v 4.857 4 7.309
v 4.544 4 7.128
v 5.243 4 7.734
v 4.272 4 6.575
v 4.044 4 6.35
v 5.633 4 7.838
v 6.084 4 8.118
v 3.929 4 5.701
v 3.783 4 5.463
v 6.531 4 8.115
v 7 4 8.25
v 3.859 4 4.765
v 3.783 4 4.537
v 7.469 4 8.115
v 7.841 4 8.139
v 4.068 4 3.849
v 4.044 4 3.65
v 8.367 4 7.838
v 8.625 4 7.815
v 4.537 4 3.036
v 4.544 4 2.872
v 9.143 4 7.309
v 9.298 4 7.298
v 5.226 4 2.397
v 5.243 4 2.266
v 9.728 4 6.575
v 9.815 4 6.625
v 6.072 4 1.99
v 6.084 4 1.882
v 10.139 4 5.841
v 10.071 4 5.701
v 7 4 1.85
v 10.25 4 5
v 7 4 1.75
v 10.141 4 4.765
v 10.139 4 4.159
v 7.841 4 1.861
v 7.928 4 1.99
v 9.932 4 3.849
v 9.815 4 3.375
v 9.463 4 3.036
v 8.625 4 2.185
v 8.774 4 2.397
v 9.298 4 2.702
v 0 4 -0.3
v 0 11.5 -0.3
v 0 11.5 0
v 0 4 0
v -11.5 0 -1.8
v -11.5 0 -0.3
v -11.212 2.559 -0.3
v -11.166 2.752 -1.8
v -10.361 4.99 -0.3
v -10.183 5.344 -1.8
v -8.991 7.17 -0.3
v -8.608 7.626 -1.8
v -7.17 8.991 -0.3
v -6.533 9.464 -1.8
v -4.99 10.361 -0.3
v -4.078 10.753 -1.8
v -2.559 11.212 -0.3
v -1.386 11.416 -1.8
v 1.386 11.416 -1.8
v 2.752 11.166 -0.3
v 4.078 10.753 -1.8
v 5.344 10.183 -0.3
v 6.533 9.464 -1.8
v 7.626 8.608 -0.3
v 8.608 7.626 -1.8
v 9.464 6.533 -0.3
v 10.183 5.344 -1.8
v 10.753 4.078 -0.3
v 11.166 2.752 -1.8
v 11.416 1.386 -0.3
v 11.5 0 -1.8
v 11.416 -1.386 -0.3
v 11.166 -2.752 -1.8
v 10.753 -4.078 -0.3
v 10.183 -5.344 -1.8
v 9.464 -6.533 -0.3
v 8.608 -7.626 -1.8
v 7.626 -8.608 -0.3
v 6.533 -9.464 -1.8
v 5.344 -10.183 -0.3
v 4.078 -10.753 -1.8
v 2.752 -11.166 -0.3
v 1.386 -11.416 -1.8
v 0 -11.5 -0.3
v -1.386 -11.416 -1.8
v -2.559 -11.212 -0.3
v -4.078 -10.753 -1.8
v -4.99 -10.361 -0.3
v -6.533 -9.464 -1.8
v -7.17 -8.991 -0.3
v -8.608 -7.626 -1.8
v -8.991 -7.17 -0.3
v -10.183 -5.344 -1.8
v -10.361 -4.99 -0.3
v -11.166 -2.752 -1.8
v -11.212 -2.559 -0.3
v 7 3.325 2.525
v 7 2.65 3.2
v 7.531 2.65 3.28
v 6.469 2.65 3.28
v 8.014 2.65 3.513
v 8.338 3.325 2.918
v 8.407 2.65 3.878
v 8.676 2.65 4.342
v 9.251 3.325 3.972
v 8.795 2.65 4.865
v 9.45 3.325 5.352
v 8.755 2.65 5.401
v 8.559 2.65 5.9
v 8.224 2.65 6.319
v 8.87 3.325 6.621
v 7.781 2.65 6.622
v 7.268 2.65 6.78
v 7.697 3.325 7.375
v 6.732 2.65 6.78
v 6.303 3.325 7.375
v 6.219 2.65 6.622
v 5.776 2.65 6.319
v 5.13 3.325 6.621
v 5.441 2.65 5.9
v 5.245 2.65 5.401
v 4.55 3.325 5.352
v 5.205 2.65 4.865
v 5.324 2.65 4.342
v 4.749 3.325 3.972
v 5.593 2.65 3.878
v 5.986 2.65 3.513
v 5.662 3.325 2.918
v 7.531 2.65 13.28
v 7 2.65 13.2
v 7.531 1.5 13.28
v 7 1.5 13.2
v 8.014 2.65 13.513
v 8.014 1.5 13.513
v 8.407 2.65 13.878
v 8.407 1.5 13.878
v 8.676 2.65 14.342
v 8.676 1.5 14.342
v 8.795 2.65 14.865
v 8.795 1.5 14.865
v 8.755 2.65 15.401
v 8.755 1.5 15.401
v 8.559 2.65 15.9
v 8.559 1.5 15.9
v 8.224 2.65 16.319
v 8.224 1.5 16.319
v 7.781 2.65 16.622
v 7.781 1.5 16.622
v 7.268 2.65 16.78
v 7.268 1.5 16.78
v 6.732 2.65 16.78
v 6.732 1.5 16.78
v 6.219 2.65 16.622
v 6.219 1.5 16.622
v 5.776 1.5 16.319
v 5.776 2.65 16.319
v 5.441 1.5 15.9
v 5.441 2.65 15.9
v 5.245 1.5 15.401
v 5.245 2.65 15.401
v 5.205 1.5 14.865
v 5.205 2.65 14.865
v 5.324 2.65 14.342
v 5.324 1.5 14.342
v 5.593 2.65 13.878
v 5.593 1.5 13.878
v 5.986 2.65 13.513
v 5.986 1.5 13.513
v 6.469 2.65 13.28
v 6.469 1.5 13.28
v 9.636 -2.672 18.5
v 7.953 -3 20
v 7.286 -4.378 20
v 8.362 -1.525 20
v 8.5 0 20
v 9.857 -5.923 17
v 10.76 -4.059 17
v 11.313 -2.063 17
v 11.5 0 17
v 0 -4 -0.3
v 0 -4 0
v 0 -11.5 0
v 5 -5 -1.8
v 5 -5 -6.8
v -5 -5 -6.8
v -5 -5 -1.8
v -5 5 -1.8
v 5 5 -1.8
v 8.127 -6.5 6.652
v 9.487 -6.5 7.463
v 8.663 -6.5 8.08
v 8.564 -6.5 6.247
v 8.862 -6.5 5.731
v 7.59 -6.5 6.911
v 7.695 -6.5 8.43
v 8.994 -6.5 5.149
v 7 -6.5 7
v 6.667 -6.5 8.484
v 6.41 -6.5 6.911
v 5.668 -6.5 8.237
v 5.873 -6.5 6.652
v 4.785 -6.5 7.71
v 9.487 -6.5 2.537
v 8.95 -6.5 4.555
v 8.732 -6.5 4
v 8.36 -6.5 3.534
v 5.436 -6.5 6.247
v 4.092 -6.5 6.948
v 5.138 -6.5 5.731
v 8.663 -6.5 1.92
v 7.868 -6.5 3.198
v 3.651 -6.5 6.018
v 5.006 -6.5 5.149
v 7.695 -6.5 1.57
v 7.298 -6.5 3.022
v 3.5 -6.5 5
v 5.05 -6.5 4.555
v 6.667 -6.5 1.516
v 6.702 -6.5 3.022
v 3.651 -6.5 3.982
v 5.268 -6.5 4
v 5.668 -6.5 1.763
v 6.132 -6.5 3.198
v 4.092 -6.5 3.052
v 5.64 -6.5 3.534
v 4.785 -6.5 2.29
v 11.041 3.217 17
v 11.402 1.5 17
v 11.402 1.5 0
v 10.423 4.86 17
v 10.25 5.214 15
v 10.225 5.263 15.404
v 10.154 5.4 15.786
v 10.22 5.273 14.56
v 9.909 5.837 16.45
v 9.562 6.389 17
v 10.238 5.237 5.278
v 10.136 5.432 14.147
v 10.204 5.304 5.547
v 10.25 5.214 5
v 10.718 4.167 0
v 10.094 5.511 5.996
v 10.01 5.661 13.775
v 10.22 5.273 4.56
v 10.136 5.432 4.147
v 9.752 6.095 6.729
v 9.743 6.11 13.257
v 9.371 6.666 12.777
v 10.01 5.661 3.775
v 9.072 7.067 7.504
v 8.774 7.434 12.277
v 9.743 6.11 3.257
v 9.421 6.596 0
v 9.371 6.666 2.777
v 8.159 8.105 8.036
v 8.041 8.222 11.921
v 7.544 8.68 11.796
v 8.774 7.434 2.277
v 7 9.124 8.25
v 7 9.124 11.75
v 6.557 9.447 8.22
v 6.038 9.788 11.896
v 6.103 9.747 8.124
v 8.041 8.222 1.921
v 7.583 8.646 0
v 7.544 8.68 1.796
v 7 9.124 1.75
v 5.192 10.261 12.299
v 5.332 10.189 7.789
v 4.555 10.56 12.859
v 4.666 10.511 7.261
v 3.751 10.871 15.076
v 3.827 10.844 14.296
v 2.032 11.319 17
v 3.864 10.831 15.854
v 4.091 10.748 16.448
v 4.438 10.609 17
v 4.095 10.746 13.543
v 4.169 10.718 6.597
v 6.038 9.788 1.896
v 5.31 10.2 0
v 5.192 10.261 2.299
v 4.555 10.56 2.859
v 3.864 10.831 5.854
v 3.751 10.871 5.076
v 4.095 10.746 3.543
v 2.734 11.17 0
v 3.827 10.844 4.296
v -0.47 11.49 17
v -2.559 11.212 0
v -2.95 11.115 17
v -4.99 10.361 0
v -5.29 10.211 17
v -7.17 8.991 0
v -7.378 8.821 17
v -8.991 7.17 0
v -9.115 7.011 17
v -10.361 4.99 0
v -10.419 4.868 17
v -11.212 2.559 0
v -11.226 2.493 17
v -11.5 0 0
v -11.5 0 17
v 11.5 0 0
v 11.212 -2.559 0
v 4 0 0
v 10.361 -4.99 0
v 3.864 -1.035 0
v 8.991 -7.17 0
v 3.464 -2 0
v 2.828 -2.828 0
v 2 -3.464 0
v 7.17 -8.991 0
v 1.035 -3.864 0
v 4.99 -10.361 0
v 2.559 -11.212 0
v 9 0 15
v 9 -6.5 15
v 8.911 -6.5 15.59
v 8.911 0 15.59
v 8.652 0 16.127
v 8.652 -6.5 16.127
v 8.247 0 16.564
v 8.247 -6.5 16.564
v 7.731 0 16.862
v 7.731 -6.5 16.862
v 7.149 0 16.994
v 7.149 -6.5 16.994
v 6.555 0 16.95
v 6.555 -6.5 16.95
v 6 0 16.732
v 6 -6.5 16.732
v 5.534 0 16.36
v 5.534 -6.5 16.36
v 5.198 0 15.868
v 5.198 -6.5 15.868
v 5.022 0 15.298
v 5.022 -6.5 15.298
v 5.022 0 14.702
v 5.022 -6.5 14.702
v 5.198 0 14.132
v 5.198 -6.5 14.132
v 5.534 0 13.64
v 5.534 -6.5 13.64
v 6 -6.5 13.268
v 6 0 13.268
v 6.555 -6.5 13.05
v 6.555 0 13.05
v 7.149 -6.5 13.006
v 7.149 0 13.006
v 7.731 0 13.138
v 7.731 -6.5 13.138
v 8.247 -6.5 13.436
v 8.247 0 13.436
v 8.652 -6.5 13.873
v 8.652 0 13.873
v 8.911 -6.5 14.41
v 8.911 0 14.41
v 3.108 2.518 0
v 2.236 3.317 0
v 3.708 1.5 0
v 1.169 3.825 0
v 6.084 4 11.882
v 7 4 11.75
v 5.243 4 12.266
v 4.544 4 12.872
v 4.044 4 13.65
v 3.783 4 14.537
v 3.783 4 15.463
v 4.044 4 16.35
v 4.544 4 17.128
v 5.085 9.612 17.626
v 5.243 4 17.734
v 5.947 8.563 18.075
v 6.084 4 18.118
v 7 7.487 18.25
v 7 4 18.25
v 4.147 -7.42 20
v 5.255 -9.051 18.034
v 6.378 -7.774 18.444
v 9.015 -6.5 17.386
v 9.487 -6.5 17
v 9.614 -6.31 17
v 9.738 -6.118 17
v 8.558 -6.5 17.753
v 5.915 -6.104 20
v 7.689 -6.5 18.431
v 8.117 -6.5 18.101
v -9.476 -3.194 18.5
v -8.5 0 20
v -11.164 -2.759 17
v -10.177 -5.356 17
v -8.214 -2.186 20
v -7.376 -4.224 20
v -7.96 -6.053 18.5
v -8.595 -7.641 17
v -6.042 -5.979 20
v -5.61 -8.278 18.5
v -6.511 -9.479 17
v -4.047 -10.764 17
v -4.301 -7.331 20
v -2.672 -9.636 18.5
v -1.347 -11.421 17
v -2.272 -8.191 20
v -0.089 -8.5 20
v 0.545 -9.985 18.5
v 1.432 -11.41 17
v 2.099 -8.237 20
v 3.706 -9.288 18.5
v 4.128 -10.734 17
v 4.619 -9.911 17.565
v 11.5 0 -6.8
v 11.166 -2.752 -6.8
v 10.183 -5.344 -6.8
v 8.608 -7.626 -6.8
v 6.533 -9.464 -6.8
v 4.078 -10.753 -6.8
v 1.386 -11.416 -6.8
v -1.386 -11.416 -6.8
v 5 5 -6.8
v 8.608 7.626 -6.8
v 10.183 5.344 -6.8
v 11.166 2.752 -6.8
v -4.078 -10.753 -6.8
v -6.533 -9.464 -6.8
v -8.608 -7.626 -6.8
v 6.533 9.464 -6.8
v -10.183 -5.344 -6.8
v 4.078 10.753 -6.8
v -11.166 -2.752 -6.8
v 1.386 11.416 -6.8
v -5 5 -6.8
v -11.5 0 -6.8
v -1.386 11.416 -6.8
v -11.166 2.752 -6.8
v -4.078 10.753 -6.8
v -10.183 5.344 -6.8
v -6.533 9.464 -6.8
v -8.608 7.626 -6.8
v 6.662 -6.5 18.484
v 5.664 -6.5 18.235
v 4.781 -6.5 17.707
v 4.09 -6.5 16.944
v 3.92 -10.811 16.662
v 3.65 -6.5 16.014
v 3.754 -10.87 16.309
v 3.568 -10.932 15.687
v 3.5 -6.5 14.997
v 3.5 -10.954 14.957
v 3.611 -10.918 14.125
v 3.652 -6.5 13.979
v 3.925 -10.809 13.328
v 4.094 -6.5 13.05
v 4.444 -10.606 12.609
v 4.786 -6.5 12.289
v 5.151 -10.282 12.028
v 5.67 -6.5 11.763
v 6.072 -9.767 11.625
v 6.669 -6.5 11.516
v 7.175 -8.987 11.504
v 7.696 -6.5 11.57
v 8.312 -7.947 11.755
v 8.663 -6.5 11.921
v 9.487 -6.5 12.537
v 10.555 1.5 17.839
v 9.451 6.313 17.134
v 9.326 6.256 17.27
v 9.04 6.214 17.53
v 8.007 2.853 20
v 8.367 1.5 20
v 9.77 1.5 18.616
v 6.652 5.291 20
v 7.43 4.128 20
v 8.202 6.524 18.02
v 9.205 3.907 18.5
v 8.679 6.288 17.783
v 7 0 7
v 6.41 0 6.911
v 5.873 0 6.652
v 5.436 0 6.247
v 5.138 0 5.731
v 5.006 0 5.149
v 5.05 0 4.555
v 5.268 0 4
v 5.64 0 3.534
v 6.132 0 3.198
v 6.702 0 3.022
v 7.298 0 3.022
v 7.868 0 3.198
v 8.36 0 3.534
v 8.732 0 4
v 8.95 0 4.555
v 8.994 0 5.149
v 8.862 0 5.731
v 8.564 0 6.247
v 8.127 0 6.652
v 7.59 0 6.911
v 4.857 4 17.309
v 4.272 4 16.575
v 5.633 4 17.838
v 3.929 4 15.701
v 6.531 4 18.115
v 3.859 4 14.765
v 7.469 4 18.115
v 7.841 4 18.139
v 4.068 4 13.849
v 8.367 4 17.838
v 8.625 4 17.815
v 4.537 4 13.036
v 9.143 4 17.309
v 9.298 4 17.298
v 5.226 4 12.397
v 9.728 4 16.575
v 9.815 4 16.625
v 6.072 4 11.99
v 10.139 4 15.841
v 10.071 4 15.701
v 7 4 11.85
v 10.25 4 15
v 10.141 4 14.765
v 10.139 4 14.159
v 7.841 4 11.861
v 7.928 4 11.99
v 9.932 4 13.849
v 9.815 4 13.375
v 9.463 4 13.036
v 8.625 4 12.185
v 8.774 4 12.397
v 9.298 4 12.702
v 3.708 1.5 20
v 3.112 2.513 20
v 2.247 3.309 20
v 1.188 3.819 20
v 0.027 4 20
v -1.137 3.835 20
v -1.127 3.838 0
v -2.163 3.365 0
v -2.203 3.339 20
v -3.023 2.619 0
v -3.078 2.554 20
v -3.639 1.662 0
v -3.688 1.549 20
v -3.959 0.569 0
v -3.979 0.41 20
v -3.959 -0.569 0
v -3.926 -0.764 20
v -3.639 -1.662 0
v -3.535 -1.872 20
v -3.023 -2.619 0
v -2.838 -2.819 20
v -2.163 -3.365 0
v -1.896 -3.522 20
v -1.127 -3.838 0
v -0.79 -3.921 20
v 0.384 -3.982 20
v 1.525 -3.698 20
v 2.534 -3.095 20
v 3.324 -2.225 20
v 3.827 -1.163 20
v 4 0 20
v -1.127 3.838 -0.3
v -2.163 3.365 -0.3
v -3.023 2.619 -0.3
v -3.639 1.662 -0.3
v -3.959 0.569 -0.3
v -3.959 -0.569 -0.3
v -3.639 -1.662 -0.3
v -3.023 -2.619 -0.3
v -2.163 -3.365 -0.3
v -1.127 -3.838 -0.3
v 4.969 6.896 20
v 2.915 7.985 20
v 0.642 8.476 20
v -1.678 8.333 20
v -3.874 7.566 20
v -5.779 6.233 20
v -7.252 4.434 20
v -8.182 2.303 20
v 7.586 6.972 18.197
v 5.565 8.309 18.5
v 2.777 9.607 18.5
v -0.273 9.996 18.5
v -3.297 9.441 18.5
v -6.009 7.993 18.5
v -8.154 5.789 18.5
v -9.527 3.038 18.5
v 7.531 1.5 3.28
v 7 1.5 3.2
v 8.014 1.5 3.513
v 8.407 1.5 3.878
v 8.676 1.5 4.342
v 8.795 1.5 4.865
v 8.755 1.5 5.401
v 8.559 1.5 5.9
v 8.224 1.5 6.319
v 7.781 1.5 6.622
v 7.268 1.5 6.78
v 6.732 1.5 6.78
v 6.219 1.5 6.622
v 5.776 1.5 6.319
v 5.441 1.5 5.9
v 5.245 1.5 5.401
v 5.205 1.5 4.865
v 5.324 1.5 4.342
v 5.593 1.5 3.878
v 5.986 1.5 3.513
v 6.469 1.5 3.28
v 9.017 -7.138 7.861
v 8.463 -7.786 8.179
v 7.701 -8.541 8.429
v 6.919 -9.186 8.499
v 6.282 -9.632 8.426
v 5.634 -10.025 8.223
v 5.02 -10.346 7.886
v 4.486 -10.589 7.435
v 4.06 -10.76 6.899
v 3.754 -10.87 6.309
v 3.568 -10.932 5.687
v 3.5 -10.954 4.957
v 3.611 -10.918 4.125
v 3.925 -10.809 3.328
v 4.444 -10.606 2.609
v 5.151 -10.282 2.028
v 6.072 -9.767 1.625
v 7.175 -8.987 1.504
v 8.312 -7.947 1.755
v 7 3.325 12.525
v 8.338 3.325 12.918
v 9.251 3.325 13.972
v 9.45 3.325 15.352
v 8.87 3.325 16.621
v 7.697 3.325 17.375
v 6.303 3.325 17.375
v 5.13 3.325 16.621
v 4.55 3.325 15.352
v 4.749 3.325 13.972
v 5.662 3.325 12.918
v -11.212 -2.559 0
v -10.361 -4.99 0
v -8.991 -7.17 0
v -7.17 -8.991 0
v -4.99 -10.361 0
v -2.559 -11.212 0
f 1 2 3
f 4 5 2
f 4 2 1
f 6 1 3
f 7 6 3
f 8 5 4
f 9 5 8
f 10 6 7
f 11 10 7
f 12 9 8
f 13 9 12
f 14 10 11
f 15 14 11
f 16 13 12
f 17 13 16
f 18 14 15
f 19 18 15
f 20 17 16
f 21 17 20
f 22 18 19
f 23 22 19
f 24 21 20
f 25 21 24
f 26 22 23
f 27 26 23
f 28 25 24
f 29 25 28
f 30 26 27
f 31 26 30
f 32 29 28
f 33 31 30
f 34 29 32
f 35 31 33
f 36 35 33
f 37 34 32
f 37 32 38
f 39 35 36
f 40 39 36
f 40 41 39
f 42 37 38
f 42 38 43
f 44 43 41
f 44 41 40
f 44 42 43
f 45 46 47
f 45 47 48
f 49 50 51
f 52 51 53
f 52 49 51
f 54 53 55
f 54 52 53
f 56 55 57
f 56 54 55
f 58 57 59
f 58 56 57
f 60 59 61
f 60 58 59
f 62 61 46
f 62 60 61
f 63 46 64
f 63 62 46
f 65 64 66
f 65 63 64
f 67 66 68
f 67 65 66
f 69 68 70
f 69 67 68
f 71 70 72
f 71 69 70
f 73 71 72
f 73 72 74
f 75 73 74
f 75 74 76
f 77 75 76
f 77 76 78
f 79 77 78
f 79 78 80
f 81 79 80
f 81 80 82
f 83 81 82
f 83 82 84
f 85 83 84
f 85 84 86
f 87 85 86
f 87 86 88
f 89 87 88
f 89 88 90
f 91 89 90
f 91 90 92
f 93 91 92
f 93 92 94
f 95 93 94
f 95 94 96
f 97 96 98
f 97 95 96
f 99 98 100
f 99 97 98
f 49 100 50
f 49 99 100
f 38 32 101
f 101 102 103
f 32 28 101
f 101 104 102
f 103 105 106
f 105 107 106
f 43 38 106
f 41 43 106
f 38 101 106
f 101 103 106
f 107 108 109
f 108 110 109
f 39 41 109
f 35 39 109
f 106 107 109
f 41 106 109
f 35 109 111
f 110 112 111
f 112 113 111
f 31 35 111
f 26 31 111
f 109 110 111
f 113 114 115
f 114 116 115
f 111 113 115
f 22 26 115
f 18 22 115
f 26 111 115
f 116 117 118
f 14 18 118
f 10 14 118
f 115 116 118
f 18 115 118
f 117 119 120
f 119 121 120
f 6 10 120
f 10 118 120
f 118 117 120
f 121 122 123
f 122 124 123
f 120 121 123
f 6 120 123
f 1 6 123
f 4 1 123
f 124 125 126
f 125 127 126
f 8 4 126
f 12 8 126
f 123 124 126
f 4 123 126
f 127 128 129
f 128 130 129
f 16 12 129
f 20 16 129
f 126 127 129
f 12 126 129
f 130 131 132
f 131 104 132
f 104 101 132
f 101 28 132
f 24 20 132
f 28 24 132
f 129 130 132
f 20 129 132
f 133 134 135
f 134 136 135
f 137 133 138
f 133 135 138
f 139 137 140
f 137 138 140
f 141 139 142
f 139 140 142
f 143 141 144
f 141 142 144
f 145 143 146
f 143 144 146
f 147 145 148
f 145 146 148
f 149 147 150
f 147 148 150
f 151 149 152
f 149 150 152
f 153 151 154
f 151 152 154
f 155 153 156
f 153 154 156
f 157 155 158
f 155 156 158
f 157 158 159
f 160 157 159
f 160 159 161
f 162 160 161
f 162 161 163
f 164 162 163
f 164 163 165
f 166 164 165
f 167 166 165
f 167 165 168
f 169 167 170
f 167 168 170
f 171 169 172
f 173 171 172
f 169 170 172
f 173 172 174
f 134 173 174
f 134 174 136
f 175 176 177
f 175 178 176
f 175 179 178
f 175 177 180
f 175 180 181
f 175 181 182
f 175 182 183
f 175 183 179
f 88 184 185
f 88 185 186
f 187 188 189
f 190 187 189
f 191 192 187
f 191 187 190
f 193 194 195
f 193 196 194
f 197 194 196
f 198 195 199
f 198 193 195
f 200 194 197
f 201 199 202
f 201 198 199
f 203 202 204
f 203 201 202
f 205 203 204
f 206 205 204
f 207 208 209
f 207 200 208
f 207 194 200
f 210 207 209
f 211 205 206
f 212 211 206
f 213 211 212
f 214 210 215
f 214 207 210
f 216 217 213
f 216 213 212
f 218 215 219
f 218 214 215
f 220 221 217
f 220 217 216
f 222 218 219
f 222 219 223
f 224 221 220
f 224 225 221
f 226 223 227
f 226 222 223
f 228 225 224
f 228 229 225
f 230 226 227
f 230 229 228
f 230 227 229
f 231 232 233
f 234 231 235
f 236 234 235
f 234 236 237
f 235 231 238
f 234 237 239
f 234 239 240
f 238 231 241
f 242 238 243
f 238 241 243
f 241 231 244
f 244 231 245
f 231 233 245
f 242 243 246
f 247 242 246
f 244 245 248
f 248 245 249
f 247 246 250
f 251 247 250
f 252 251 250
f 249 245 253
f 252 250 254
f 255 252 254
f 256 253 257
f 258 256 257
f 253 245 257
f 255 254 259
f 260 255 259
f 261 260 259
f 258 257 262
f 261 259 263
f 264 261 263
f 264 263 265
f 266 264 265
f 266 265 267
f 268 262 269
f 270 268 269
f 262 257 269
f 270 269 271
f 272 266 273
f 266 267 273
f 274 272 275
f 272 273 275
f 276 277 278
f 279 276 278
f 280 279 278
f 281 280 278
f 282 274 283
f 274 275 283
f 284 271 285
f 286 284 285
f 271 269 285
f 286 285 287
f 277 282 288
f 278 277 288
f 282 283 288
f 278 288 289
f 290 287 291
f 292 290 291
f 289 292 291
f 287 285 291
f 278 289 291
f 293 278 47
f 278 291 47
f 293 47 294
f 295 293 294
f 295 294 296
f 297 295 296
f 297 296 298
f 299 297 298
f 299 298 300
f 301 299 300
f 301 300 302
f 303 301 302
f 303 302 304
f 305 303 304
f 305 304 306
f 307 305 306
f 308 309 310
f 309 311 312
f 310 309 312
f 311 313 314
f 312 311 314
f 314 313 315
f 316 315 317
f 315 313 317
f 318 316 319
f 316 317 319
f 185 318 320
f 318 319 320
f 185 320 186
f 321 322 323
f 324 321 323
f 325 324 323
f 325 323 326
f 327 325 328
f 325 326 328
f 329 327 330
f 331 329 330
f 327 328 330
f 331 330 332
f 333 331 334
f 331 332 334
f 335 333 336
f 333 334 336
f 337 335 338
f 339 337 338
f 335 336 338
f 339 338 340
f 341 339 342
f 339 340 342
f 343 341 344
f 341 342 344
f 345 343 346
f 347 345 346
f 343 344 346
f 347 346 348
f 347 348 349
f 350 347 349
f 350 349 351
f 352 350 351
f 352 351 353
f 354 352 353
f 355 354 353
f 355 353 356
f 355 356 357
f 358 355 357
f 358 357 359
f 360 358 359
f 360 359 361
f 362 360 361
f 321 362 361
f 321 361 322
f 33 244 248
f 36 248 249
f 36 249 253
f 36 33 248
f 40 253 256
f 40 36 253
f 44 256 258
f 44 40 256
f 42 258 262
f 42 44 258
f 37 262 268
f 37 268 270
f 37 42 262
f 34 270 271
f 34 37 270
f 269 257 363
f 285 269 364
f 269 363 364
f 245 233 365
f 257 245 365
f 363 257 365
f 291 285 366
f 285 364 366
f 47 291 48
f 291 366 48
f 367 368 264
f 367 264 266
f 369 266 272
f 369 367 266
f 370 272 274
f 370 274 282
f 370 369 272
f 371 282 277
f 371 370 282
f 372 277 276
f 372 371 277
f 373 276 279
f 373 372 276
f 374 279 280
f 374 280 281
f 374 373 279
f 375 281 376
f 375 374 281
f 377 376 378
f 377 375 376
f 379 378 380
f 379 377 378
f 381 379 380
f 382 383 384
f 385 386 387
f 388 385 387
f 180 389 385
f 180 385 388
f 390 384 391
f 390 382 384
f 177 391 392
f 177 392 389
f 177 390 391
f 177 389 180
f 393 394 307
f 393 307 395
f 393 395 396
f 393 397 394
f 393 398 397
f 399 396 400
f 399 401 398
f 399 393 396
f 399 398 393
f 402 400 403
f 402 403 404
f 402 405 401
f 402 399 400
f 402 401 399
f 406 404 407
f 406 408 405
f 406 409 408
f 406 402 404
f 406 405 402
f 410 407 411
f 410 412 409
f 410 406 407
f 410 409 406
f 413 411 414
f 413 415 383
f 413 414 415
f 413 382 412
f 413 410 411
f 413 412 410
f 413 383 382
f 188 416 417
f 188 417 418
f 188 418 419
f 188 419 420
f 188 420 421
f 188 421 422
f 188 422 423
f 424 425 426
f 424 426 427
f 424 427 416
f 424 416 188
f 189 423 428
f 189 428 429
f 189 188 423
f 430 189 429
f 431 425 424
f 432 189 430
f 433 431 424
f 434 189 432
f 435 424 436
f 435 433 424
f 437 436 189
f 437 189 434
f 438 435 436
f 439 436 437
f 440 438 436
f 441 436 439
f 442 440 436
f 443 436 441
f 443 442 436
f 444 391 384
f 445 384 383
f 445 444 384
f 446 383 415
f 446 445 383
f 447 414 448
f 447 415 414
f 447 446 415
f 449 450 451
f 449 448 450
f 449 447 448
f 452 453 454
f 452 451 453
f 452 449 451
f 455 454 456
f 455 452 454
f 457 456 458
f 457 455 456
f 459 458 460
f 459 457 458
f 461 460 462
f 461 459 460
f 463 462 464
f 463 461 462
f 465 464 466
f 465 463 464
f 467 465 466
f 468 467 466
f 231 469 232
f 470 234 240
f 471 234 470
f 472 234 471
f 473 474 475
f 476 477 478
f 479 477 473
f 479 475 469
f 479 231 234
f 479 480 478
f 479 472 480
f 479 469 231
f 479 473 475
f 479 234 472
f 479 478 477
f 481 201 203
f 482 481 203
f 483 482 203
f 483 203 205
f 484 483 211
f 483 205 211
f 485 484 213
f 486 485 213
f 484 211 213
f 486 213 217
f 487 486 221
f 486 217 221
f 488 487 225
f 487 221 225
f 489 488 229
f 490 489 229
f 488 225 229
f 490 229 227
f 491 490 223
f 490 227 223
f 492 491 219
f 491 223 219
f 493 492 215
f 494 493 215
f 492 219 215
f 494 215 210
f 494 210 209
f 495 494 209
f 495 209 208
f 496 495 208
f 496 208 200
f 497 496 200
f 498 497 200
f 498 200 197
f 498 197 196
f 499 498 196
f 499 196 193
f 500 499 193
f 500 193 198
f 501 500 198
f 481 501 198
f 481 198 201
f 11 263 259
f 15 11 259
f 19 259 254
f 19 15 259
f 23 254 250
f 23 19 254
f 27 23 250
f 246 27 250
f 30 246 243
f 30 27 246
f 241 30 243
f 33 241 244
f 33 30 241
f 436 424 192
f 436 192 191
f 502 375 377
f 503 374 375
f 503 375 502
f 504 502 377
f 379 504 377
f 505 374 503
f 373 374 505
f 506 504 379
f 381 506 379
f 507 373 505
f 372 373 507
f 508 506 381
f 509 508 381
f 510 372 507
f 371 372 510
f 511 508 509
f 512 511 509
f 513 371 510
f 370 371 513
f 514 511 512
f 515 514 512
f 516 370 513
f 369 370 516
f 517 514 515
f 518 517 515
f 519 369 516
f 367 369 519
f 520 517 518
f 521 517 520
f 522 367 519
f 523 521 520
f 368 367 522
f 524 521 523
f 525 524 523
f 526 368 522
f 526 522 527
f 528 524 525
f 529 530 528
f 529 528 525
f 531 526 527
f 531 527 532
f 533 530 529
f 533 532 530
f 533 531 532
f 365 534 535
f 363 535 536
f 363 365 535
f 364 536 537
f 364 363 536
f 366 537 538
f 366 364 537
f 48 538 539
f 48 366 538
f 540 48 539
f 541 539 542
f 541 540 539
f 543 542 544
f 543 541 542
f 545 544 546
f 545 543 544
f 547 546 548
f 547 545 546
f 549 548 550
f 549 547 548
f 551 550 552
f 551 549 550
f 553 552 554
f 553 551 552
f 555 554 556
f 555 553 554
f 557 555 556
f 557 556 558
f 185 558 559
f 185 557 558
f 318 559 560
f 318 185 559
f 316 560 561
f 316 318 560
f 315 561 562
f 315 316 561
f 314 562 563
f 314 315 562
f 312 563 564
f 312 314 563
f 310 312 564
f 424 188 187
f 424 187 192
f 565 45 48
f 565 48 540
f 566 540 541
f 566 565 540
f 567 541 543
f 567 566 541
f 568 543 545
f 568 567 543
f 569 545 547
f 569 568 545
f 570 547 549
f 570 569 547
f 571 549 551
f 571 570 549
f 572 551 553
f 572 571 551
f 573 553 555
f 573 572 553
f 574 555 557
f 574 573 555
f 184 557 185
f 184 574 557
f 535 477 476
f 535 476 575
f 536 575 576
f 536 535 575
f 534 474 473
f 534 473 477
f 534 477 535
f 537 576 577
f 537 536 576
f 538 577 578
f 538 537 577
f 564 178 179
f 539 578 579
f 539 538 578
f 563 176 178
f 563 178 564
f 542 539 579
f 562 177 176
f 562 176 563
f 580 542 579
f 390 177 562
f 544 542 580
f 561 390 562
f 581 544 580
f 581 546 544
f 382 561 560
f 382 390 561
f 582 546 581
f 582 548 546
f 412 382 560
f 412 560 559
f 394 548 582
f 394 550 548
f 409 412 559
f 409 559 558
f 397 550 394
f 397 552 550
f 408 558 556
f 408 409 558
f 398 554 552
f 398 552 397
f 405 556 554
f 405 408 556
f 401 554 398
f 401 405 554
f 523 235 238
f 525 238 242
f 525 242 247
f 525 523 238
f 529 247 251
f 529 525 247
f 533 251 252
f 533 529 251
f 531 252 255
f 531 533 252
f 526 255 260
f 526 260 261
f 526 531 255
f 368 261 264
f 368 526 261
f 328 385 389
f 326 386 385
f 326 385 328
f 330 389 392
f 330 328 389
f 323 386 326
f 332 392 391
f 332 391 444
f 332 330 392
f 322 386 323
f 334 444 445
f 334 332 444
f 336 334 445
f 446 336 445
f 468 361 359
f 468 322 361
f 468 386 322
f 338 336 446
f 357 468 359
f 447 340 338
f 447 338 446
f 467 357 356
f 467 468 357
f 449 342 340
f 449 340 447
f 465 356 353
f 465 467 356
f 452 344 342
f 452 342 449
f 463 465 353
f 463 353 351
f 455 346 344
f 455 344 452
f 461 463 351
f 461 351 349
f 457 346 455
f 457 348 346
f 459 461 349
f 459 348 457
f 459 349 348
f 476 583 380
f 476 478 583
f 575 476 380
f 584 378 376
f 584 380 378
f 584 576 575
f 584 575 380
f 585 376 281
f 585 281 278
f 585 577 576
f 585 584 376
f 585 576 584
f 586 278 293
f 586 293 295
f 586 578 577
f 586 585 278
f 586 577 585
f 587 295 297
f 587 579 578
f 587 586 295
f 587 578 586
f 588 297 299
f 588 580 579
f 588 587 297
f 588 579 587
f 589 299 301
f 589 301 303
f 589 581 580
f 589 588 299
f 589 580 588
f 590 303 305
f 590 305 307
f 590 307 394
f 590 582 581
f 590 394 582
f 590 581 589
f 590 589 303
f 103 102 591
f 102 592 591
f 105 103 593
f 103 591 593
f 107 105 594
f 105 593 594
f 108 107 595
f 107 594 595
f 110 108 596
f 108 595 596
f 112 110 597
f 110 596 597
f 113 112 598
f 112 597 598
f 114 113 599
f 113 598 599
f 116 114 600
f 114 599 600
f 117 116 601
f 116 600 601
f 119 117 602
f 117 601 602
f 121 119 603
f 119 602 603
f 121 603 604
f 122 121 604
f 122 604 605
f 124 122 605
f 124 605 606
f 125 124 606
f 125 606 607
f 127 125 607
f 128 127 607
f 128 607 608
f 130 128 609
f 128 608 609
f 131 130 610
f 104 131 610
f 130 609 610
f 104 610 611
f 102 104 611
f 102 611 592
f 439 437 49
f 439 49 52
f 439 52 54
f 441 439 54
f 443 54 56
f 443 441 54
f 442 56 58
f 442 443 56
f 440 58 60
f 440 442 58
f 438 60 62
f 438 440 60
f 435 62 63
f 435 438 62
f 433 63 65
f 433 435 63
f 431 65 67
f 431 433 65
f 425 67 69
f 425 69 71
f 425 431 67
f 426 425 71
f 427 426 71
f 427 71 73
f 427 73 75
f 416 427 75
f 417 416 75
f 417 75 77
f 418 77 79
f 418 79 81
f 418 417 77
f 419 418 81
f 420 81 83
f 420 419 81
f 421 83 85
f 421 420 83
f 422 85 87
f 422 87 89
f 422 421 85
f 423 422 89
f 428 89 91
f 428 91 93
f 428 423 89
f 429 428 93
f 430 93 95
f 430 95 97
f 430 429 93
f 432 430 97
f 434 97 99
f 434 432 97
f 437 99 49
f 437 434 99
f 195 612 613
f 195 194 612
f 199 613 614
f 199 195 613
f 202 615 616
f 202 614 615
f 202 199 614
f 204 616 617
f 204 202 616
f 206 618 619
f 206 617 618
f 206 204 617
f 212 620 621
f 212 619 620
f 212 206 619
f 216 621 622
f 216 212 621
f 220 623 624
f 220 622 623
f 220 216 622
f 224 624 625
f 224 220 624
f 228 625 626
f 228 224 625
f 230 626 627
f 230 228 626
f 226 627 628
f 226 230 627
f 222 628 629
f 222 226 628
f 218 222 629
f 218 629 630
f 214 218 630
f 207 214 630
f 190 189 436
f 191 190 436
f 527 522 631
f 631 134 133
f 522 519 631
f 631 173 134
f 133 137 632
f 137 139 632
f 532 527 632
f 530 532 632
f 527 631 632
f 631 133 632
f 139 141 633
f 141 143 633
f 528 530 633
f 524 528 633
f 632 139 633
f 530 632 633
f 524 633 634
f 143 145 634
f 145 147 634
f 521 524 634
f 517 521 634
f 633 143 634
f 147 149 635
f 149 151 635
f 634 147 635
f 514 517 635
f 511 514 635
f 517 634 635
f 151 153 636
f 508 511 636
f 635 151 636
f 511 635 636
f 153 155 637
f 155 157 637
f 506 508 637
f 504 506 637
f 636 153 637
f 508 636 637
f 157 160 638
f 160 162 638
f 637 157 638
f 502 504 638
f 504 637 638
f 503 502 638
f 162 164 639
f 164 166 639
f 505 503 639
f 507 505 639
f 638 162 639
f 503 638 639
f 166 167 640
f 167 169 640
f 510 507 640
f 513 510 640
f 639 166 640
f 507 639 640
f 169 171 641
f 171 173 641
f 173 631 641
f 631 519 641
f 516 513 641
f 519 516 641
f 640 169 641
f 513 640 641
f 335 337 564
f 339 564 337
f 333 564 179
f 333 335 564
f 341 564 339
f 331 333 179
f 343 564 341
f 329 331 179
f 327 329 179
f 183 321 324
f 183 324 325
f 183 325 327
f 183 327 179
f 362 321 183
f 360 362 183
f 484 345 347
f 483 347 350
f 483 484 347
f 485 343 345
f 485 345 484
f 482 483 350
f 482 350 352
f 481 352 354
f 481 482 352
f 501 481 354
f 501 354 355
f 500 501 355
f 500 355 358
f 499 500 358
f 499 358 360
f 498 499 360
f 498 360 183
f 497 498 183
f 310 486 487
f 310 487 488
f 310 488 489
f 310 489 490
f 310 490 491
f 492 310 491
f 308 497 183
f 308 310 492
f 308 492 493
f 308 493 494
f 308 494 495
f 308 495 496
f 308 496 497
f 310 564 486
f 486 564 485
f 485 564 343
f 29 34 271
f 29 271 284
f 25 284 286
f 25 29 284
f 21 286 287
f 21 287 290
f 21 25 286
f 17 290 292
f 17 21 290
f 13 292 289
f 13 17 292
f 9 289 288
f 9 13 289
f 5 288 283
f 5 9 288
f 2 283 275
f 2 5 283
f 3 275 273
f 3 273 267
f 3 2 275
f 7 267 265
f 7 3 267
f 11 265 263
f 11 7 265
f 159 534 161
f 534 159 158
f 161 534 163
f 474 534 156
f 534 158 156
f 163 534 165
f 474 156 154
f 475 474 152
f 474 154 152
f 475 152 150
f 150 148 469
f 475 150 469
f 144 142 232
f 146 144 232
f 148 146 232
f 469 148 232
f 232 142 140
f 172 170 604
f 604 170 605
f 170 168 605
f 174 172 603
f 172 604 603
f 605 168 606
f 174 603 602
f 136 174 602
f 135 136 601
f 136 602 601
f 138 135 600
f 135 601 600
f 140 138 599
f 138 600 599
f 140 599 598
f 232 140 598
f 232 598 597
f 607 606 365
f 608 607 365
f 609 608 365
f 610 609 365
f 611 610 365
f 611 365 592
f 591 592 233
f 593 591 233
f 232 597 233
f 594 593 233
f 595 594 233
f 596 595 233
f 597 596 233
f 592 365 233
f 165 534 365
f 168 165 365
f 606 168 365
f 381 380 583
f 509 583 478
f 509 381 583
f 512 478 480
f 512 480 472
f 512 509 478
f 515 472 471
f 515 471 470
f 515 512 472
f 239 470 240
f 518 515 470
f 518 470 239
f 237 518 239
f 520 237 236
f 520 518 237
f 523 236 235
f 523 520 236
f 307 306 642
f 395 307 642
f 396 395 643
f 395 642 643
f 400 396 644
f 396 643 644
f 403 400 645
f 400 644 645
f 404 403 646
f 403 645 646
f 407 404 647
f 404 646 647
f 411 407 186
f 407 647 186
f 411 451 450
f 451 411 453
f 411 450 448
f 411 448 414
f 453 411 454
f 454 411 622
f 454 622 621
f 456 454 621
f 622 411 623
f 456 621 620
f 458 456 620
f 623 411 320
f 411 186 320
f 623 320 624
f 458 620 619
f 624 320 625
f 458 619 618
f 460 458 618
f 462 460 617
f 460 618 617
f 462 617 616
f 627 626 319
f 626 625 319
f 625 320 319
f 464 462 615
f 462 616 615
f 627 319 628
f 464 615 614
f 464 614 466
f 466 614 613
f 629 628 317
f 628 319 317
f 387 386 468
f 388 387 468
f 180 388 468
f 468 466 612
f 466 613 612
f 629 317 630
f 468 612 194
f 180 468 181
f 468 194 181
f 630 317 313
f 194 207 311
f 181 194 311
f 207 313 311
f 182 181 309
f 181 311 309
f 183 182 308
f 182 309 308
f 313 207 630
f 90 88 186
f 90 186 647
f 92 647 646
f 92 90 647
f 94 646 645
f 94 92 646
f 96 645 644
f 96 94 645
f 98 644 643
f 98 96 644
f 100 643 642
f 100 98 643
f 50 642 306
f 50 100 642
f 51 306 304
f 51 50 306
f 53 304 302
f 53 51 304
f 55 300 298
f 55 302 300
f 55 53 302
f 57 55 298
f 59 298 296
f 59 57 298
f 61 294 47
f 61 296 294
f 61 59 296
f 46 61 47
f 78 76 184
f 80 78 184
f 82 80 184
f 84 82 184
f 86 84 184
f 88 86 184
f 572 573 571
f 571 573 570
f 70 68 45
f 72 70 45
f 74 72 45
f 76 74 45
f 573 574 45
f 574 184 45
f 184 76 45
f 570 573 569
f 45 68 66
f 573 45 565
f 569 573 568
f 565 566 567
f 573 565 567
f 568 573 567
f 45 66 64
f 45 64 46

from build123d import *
from build123d.topology import SkipClean

# Parameters (mm, degrees)
SZKIC1_R                                           = 11.5
SZKIC1_R_2                                         = 4
DODANIE_WYCI_GNI_CIE1_DEPTH                        = 20
SZKIC3_W                                           = 11.5
SZKIC3_H                                           = 20
WYTNIJ_WYCI_GNI_CIE1_DEPTH                         = 1.5
WYTNIJ_WYCI_GNI_CIE2_DEPTH                         = 32
POG_BIENIE_STO_KOWE_POD_M3_WKR_T_Z_BEM_D           = 3.6
POG_BIENIE_STO_KOWE_POD_M3_WKR_T_Z_BEM_CSINK_D     = 6.3
POG_BIENIE_STO_KOWE_POD_M3_WKR_T_Z_BEM_CSINK_ANGLE = 90
SZKIC7_R                                           = 3.5
WYTNIJ_WYCI_GNI_CIE3_DEPTH                         = 32
SZKIC8_R                                           = 2
WYTNIJ_WYCI_GNI_CIE4_DEPTH                         = 7
DODANIE_WYCI_GNI_CIE2_START                        = 0.3
DODANIE_WYCI_GNI_CIE2_DEPTH                        = 0.3
DODANIE_WYCI_GNI_CIE3_START                        = 1.5
SZKIC10_R                                          = 11.5
DODANIE_WYCI_GNI_CIE3_DEPTH                        = 1.5
DODANIE_WYCI_GNI_CIE4_START                        = 5
SZKIC11_R                                          = 11.5
SZKIC11_W                                          = 10
SZKIC11_H                                          = 10
DODANIE_WYCI_GNI_CIE4_DEPTH                        = 5
SFAZOWANIE1_SIZE                                   = 3


with BuildPart() as part:
    # Szkic1 → Dodanie-wyciągnięcie1 (new body)
    with BuildSketch(Plane.XY):
        with Locations(Location((0, 0, 0), (0, 0, 180))):
            Circle(SZKIC1_R)
        with Locations(Location((0, 0, 0), (0, 0, 180))):
            Circle(SZKIC1_R_2, mode=Mode.SUBTRACT)
    extrude(amount=DODANIE_WYCI_GNI_CIE1_DEPTH)

    # Szkic3 → Wytnij-wyciągnięcie1 (cut)
    with BuildSketch(Plane(origin=(0, 0, 0), x_dir=(1, 0, 0), z_dir=(0, 1, 0))):
        with Locations((5.75, -10)):
            Rectangle(SZKIC3_W, SZKIC3_H)
    extrude(amount=WYTNIJ_WYCI_GNI_CIE1_DEPTH, mode=Mode.SUBTRACT)

    # Szkic4 → Wytnij-wyciągnięcie2 (cut)
    with BuildSketch(Plane(origin=(0, 4, 0), x_dir=(1, 0, 0), z_dir=(0, 1, 0))):
        with BuildLine():
            ThreePointArc((7, -11.75), (3.75, -15), (7, -18.25))
            Line((7, -18.25), (7, -11.75))
        make_face()
        with BuildLine():
            Line((7, -11.75), (7, -18.25))
            ThreePointArc((7, -18.25), (9.298097039, -17.298097039), (10.25, -15))
            ThreePointArc((10.25, -15), (9.298097039, -12.701902961), (7, -11.75))
        make_face()
        with BuildLine():
            ThreePointArc((7, -1.75), (3.75, -5), (7, -8.25))
            Line((7, -8.25), (7, -1.75))
        make_face()
        with BuildLine():
            Line((7, -1.75), (7, -8.25))
            ThreePointArc((7, -8.25), (9.298097039, -7.298097039), (10.25, -5))
            ThreePointArc((10.25, -5), (9.298097039, -2.701902961), (7, -1.75))
        make_face()
    extrude(amount=WYTNIJ_WYCI_GNI_CIE2_DEPTH, mode=Mode.SUBTRACT)

    # Pogłębienie stożkowe pod M3 Wkręt z łbem płaskim1 (through all)
    with Locations(Plane(origin=(7, 4, 15), x_dir=(0, 0, 1), z_dir=(0, 1, 0))):
        with Locations((0, 0), (-10, 0)):
            CounterSinkHole(POG_BIENIE_STO_KOWE_POD_M3_WKR_T_Z_BEM_D / 2, POG_BIENIE_STO_KOWE_POD_M3_WKR_T_Z_BEM_CSINK_D / 2, counter_sink_angle=POG_BIENIE_STO_KOWE_POD_M3_WKR_T_Z_BEM_CSINK_ANGLE)

    # Szkic7 → Wytnij-wyciągnięcie3 (cut)
    with BuildSketch(Plane(origin=(0, -6.5, 0), x_dir=(-1, 0, 0), z_dir=(0, -1, 0))):
        with Locations((-7, -5)):
            Circle(SZKIC7_R)
        with Locations((-7, -15)):
            Circle(SZKIC7_R)
    extrude(amount=WYTNIJ_WYCI_GNI_CIE3_DEPTH, mode=Mode.SUBTRACT)

    # Szkic8 → Wytnij-wyciągnięcie4 (cut)
    with BuildSketch(Plane.XZ.offset(6.5)):
        with Locations((7, 15)):
            Circle(SZKIC8_R)
        with Locations(Location((7, 5, 0), (0, 0, 90))):
            Circle(SZKIC8_R)
    extrude(amount=-WYTNIJ_WYCI_GNI_CIE4_DEPTH, mode=Mode.SUBTRACT)

    # Szkic9 → Dodanie-wyciągnięcie2 (add)
    with SkipClean():  # the faces are left unmerged after this step: merging them gives an invalid solid
        with BuildSketch(Plane(origin=(0, 0, 0), x_dir=(-1, 0, 0), z_dir=(0, 0, -1)).offset(DODANIE_WYCI_GNI_CIE2_START)):
            with BuildLine():
                Line((0, 11.5), (0, 4))
                ThreePointArc((0, 4), (4, 0), (0, -4))
                Line((0, -4), (0, -11.5))
                ThreePointArc((0, -11.5), (11.5, 0), (0, 11.5))
            make_face()
        extrude(amount=-DODANIE_WYCI_GNI_CIE2_DEPTH)

    # Szkic10 → Dodanie-wyciągnięcie3 (add)
    with SkipClean():  # the faces are left unmerged after this step: merging them gives an invalid solid
        with BuildSketch(Plane(origin=(0, 0, -0.3), x_dir=(-1, 0, 0), z_dir=(0, 0, -1)).offset(DODANIE_WYCI_GNI_CIE3_START)):
            Circle(SZKIC10_R)
        extrude(amount=-DODANIE_WYCI_GNI_CIE3_DEPTH)

    # Szkic11 → Dodanie-wyciągnięcie4 (add)
    with SkipClean():  # the faces are left unmerged after this step: merging them gives an invalid solid
        with BuildSketch(Plane(origin=(0, 0, -1.8), x_dir=(-1, 0, 0), z_dir=(0, 0, -1)).offset(DODANIE_WYCI_GNI_CIE4_START)):
            Circle(SZKIC11_R)
            Rectangle(SZKIC11_W, SZKIC11_H, mode=Mode.SUBTRACT)
        extrude(amount=-DODANIE_WYCI_GNI_CIE4_DEPTH)

    # Sfazowanie1
    # the kernel refuses this chamfer: 3 mm, written as the material it takes off along each edge
    with BuildSketch(Plane(origin=(0, 0, 20), x_dir=(-1, 0, 0), z_dir=(0, 1, 0))) as sfazowanie1_piece_1:
        Polygon((11.5, -SFAZOWANIE1_SIZE), (11.5 - SFAZOWANIE1_SIZE, 0), (11.5, 0), align=None)
    revolve(axis=Axis((0, 0, 20), (0, 0, 1)), revolution_arc=218.500054596, mode=Mode.SUBTRACT)
    with BuildSketch(Plane(origin=(0, 0, 20), x_dir=(0.8571646812696857, -0.5150424343525863, 0), z_dir=(-0.5150424343525863, -0.8571646812696857, 0))) as sfazowanie1_piece_2:
        Polygon((11.5, -SFAZOWANIE1_SIZE), (11.5 - SFAZOWANIE1_SIZE, 0), (11.5, 0), align=None)
    revolve(axis=Axis((0, 0, 20), (0, 0, 1)), revolution_arc=211.000291399, mode=Mode.SUBTRACT)


solid = part.part
